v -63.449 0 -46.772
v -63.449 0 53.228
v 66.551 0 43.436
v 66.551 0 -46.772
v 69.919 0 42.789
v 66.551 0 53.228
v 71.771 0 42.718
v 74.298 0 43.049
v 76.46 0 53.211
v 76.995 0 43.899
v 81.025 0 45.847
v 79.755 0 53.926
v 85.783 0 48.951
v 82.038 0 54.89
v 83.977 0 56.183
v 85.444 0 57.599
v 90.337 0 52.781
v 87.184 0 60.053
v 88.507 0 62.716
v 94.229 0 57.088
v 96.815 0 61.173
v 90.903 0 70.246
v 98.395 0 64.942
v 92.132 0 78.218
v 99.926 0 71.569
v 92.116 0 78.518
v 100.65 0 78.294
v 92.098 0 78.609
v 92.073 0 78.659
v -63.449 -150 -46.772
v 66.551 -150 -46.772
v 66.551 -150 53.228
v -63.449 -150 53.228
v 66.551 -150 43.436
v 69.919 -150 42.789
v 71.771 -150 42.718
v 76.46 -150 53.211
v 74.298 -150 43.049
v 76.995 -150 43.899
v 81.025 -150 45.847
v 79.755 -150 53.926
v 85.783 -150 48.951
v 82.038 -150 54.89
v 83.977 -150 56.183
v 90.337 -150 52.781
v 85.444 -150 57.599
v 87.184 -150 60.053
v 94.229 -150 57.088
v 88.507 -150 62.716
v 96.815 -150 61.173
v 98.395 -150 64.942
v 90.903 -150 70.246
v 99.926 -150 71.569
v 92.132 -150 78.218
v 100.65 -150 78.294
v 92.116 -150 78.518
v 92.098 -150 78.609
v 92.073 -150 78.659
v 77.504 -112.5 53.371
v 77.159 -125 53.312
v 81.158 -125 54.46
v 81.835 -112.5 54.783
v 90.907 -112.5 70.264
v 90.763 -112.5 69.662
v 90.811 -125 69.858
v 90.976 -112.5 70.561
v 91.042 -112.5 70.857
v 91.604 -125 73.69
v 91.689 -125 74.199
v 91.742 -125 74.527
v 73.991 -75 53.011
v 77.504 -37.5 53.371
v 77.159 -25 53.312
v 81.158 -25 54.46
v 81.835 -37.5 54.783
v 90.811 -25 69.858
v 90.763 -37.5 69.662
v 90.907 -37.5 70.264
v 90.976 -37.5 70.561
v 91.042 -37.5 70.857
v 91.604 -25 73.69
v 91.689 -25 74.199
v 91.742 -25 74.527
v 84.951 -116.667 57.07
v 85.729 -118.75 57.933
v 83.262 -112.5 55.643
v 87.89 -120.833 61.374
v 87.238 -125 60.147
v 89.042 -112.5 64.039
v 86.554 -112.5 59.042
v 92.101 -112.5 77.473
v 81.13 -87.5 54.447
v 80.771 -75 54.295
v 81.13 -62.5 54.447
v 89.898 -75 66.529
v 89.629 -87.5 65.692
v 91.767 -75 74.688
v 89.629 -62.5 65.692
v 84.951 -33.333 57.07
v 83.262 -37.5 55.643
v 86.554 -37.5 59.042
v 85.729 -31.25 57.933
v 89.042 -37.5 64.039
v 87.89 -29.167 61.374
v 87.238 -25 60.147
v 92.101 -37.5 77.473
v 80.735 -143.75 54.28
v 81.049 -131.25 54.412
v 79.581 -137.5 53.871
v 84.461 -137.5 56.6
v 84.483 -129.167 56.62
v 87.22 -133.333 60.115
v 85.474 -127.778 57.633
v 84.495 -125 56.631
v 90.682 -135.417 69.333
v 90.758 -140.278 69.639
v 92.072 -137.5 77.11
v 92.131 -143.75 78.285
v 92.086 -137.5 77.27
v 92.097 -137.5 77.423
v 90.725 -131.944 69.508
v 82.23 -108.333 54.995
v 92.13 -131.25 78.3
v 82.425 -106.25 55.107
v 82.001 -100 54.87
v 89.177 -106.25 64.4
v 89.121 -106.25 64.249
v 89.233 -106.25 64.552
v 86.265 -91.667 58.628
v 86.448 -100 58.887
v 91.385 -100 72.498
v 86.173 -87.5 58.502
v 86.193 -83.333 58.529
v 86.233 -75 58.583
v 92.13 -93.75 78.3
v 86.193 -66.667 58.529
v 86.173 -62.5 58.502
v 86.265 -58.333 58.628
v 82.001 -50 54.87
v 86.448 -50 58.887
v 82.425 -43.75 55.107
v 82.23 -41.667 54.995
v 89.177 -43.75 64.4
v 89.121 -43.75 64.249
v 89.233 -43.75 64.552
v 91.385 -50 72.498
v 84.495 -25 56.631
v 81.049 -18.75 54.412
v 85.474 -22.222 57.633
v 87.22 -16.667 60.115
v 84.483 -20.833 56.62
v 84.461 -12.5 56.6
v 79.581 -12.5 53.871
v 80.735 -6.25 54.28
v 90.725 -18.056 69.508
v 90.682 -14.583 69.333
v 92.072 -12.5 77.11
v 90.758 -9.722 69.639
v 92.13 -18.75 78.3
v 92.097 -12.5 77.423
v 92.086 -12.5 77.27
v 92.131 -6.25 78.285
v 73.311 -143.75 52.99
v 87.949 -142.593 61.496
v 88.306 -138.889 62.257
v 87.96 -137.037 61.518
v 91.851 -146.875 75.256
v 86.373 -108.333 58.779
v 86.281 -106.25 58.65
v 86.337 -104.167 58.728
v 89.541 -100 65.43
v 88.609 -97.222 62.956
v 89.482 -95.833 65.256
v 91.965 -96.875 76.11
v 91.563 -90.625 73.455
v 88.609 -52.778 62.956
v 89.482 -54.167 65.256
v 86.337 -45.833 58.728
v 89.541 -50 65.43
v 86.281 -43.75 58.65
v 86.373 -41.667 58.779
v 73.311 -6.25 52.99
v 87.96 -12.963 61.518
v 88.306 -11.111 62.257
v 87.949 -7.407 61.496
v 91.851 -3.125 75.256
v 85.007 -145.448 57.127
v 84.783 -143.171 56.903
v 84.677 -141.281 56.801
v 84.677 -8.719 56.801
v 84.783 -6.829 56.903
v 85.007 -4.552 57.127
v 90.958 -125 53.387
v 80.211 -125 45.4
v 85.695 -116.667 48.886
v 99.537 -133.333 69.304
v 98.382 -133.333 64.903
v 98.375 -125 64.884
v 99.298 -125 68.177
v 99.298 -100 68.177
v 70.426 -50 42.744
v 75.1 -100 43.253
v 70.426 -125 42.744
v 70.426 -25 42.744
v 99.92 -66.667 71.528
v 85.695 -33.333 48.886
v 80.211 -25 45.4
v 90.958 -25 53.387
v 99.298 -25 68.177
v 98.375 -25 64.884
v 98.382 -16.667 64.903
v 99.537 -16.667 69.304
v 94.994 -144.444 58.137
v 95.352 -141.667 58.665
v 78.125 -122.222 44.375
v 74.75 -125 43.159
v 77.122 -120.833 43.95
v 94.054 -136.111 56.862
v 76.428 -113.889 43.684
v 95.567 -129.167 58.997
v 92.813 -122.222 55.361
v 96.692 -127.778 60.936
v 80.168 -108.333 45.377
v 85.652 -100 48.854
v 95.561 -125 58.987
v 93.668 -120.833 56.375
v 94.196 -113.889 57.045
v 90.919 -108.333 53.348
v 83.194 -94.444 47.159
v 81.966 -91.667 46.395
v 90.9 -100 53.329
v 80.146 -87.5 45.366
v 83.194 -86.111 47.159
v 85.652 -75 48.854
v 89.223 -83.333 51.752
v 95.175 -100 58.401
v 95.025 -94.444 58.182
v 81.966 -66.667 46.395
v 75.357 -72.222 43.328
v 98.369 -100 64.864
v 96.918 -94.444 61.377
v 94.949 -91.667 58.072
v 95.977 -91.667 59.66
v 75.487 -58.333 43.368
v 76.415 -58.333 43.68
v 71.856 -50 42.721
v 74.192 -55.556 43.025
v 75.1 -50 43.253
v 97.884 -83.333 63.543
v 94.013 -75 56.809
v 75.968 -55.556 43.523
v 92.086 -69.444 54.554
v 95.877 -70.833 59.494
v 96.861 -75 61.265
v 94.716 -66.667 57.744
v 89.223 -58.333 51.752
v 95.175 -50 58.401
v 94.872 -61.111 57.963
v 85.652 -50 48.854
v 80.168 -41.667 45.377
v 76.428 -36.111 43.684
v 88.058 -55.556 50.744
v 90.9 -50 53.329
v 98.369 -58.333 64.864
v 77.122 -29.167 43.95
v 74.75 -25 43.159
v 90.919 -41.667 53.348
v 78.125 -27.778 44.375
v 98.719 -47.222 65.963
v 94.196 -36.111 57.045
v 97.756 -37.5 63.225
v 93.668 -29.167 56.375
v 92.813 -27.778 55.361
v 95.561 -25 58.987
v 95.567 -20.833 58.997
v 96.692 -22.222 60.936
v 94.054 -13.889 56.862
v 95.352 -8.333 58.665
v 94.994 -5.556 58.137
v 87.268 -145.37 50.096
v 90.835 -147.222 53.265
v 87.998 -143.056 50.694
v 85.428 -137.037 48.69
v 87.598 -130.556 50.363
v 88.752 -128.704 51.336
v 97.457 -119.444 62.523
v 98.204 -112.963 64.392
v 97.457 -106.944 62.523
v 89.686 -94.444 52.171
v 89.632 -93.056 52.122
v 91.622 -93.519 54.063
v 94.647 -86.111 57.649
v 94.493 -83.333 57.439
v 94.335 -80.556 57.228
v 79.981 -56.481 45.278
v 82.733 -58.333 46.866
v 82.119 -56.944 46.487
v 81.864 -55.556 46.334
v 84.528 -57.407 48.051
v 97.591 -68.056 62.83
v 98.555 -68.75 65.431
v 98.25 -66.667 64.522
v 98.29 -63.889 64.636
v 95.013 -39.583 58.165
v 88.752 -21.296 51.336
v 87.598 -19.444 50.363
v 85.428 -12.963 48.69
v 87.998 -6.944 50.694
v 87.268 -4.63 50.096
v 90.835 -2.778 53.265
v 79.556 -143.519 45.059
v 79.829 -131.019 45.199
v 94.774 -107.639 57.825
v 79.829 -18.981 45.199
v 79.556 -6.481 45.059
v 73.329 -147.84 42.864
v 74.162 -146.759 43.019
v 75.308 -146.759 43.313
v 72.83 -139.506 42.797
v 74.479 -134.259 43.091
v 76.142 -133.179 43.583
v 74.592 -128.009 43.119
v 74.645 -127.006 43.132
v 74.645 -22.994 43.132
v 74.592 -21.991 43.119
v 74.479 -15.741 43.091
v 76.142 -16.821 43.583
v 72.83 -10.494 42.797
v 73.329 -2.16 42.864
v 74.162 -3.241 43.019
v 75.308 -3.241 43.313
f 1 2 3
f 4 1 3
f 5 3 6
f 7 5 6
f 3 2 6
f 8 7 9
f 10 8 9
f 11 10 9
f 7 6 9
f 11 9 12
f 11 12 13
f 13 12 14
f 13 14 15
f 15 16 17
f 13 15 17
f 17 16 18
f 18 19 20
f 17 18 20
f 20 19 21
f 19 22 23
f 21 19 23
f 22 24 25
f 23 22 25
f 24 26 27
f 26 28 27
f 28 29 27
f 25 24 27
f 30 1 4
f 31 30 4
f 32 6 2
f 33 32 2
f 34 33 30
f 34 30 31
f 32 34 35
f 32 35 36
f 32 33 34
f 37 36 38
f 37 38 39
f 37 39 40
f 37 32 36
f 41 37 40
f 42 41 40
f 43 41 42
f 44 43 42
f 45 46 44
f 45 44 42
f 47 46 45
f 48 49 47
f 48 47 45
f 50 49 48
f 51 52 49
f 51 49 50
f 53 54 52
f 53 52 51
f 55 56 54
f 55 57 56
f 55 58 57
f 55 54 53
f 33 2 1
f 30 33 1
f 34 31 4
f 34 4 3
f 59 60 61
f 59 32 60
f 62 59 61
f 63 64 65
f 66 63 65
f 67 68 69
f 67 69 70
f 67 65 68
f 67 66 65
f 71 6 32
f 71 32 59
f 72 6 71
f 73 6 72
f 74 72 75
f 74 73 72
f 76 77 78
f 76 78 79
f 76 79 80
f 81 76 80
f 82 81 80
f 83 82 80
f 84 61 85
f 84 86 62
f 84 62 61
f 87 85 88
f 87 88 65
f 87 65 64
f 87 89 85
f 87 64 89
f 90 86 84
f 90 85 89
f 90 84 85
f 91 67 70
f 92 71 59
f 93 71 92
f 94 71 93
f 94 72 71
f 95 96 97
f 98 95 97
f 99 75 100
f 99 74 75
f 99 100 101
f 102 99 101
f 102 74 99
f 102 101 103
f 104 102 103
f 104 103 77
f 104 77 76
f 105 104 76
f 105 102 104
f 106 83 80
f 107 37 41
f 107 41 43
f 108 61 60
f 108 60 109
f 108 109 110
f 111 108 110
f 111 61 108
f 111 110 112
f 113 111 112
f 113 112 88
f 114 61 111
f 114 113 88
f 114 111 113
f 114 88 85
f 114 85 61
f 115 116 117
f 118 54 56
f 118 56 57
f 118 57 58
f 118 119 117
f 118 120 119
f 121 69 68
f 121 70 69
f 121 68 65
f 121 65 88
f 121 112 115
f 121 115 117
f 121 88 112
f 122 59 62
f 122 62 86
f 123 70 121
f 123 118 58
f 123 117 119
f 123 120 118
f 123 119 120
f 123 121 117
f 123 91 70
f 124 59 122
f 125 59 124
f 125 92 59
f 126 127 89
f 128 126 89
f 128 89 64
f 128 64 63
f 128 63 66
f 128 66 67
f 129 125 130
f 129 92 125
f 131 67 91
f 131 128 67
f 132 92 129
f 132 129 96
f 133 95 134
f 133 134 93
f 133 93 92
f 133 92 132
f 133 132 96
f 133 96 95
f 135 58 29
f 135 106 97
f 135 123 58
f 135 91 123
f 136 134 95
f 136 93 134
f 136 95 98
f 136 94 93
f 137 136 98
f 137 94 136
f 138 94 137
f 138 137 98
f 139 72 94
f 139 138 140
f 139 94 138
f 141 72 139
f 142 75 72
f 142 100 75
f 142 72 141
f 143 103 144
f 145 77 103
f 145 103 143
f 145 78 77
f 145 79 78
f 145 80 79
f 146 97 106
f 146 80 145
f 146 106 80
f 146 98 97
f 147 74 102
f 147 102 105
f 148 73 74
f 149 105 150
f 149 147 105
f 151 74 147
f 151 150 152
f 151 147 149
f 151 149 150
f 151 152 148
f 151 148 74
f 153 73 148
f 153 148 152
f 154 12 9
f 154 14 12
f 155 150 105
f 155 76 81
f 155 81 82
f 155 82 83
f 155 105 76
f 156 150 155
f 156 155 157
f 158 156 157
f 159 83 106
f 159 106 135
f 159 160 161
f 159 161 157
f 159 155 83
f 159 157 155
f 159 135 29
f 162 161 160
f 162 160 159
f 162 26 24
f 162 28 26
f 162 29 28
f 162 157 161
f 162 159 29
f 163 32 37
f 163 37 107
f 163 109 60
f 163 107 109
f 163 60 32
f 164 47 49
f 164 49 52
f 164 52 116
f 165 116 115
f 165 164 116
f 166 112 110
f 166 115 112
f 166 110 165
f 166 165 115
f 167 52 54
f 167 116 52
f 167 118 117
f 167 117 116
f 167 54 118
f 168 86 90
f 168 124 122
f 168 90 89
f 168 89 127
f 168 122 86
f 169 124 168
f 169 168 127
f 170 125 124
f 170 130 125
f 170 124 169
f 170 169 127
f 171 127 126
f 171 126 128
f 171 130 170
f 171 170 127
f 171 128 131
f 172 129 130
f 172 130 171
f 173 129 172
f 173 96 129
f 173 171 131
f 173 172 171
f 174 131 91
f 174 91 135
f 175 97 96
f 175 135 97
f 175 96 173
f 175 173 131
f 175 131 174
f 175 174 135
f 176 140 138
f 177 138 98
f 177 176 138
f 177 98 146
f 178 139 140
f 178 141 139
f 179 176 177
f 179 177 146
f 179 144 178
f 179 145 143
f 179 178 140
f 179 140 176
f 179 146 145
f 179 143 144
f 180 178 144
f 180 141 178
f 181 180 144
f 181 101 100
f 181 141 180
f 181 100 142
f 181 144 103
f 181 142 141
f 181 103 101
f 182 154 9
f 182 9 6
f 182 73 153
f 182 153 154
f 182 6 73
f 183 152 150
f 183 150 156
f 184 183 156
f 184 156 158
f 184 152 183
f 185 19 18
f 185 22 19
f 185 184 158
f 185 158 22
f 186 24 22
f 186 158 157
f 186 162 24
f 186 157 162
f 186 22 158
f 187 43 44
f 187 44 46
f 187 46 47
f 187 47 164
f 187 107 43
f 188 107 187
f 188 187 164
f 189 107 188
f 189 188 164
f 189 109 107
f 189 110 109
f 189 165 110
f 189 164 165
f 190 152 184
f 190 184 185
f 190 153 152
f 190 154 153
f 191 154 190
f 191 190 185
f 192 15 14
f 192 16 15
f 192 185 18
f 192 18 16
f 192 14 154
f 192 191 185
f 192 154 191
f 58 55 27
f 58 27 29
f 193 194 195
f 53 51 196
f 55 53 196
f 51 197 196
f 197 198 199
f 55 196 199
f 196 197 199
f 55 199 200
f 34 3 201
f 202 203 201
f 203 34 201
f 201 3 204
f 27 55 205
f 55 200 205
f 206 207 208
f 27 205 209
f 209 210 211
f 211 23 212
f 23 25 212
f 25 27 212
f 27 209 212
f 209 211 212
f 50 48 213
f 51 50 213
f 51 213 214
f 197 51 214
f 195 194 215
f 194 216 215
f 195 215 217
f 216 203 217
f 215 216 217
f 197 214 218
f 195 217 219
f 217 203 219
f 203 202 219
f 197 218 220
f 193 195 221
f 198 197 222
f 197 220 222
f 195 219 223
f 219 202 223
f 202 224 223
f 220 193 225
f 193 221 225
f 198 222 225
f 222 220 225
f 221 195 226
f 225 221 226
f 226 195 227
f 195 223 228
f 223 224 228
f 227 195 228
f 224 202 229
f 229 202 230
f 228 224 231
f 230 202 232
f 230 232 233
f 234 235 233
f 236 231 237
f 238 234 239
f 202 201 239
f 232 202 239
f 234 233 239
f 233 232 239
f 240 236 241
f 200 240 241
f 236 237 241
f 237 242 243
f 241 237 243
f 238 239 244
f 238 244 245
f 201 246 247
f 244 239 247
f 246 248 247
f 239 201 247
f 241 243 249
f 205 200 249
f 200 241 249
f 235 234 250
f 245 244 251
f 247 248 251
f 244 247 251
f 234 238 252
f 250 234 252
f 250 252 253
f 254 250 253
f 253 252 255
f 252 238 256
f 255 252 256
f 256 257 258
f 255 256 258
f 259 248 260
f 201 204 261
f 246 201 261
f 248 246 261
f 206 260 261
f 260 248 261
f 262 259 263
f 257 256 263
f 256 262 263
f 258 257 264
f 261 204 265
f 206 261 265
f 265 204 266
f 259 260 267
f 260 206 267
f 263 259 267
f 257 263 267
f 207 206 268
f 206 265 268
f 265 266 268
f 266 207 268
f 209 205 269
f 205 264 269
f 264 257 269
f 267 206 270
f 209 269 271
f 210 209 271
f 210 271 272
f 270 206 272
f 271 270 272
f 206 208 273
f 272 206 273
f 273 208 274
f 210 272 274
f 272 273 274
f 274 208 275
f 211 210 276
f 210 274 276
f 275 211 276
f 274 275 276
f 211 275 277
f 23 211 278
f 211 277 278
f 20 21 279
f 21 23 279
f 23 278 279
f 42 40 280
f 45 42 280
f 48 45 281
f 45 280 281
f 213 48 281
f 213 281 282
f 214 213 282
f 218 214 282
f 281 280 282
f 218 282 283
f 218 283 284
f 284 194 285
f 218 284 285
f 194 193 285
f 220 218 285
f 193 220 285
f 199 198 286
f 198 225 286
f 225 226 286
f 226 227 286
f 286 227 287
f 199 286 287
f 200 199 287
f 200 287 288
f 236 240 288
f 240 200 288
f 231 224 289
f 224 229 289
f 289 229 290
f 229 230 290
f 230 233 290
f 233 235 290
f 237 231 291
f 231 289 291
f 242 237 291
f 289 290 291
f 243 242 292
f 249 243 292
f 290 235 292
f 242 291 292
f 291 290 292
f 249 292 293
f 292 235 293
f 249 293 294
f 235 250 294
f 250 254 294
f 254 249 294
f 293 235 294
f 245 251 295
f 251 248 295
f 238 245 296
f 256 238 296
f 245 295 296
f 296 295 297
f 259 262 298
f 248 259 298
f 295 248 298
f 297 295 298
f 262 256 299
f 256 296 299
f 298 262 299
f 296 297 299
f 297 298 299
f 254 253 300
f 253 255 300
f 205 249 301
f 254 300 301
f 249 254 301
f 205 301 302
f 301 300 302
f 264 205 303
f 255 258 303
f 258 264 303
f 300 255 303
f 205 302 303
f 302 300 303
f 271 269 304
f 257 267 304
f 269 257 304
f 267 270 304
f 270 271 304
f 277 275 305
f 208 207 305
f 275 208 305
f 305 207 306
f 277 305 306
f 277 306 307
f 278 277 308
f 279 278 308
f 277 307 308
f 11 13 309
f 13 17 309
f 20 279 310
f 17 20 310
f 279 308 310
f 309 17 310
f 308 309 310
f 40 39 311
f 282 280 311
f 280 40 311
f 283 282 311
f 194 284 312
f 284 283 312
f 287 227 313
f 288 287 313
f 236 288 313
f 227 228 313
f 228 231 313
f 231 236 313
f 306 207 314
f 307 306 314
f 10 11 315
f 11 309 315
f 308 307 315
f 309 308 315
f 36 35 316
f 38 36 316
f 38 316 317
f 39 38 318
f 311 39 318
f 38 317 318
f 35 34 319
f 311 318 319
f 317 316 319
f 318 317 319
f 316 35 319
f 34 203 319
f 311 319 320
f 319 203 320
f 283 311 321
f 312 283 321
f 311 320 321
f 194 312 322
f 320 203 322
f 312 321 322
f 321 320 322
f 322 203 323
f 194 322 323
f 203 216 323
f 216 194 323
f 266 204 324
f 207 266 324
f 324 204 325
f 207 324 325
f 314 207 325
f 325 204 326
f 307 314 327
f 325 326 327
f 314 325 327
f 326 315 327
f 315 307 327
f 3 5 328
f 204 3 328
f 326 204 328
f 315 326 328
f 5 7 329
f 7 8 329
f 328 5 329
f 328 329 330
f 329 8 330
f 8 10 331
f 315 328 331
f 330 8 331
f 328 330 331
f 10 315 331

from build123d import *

# Parameters (mm, degrees)
F1_DEPTH = 150


with BuildPart() as f1:
    # F0 (on Front) → F1 (new body)
    with BuildSketch(Plane.XZ):
        with BuildLine():
            Line((66.5512742102, 53.22832472), (-63.4487257898, 53.22832472))
            Line((-63.4487257898, 53.22832472), (-63.4487257898, -46.77167528))
            Line((-63.4487257898, -46.77167528), (66.5512742102, -46.77167528))
            Line((66.5512742102, -46.77167528), (66.5512742102, 43.4356927872))
            add(Edge.make_bspline(
                [(66.5512742102, 43.4356927872), (69.0458437789, 42.8412241475), (75.8185758553, 41.2272475823), (98.8077186481, 57.2419967752), (100.0567297058, 71.5116963556), (100.6503552198, 78.2937481999)],
                knots=[0, 0, 0, 0, 0.2342815252, 0.6360720585, 1, 1, 1, 1], degree=3))
            Line((100.6503552198, 78.2937481999), (92.0727178454, 78.6587521434))
            add(Edge.make_bspline(
                [(66.5512742102, 53.22832472), (74.1004513767, 52.7601957711), (89.292724355, 51.8181139225), (92.4721770478, 78.2514275942), (92.0727178454, 78.6587521434)],
                knots=[0, 0, 0, 0, 0.4706037901, 0.9470623203, 0.9470623203, 0.9470623203, 0.9470623203], degree=3))
        make_face()
    extrude(amount=F1_DEPTH)


solid = f1.part
